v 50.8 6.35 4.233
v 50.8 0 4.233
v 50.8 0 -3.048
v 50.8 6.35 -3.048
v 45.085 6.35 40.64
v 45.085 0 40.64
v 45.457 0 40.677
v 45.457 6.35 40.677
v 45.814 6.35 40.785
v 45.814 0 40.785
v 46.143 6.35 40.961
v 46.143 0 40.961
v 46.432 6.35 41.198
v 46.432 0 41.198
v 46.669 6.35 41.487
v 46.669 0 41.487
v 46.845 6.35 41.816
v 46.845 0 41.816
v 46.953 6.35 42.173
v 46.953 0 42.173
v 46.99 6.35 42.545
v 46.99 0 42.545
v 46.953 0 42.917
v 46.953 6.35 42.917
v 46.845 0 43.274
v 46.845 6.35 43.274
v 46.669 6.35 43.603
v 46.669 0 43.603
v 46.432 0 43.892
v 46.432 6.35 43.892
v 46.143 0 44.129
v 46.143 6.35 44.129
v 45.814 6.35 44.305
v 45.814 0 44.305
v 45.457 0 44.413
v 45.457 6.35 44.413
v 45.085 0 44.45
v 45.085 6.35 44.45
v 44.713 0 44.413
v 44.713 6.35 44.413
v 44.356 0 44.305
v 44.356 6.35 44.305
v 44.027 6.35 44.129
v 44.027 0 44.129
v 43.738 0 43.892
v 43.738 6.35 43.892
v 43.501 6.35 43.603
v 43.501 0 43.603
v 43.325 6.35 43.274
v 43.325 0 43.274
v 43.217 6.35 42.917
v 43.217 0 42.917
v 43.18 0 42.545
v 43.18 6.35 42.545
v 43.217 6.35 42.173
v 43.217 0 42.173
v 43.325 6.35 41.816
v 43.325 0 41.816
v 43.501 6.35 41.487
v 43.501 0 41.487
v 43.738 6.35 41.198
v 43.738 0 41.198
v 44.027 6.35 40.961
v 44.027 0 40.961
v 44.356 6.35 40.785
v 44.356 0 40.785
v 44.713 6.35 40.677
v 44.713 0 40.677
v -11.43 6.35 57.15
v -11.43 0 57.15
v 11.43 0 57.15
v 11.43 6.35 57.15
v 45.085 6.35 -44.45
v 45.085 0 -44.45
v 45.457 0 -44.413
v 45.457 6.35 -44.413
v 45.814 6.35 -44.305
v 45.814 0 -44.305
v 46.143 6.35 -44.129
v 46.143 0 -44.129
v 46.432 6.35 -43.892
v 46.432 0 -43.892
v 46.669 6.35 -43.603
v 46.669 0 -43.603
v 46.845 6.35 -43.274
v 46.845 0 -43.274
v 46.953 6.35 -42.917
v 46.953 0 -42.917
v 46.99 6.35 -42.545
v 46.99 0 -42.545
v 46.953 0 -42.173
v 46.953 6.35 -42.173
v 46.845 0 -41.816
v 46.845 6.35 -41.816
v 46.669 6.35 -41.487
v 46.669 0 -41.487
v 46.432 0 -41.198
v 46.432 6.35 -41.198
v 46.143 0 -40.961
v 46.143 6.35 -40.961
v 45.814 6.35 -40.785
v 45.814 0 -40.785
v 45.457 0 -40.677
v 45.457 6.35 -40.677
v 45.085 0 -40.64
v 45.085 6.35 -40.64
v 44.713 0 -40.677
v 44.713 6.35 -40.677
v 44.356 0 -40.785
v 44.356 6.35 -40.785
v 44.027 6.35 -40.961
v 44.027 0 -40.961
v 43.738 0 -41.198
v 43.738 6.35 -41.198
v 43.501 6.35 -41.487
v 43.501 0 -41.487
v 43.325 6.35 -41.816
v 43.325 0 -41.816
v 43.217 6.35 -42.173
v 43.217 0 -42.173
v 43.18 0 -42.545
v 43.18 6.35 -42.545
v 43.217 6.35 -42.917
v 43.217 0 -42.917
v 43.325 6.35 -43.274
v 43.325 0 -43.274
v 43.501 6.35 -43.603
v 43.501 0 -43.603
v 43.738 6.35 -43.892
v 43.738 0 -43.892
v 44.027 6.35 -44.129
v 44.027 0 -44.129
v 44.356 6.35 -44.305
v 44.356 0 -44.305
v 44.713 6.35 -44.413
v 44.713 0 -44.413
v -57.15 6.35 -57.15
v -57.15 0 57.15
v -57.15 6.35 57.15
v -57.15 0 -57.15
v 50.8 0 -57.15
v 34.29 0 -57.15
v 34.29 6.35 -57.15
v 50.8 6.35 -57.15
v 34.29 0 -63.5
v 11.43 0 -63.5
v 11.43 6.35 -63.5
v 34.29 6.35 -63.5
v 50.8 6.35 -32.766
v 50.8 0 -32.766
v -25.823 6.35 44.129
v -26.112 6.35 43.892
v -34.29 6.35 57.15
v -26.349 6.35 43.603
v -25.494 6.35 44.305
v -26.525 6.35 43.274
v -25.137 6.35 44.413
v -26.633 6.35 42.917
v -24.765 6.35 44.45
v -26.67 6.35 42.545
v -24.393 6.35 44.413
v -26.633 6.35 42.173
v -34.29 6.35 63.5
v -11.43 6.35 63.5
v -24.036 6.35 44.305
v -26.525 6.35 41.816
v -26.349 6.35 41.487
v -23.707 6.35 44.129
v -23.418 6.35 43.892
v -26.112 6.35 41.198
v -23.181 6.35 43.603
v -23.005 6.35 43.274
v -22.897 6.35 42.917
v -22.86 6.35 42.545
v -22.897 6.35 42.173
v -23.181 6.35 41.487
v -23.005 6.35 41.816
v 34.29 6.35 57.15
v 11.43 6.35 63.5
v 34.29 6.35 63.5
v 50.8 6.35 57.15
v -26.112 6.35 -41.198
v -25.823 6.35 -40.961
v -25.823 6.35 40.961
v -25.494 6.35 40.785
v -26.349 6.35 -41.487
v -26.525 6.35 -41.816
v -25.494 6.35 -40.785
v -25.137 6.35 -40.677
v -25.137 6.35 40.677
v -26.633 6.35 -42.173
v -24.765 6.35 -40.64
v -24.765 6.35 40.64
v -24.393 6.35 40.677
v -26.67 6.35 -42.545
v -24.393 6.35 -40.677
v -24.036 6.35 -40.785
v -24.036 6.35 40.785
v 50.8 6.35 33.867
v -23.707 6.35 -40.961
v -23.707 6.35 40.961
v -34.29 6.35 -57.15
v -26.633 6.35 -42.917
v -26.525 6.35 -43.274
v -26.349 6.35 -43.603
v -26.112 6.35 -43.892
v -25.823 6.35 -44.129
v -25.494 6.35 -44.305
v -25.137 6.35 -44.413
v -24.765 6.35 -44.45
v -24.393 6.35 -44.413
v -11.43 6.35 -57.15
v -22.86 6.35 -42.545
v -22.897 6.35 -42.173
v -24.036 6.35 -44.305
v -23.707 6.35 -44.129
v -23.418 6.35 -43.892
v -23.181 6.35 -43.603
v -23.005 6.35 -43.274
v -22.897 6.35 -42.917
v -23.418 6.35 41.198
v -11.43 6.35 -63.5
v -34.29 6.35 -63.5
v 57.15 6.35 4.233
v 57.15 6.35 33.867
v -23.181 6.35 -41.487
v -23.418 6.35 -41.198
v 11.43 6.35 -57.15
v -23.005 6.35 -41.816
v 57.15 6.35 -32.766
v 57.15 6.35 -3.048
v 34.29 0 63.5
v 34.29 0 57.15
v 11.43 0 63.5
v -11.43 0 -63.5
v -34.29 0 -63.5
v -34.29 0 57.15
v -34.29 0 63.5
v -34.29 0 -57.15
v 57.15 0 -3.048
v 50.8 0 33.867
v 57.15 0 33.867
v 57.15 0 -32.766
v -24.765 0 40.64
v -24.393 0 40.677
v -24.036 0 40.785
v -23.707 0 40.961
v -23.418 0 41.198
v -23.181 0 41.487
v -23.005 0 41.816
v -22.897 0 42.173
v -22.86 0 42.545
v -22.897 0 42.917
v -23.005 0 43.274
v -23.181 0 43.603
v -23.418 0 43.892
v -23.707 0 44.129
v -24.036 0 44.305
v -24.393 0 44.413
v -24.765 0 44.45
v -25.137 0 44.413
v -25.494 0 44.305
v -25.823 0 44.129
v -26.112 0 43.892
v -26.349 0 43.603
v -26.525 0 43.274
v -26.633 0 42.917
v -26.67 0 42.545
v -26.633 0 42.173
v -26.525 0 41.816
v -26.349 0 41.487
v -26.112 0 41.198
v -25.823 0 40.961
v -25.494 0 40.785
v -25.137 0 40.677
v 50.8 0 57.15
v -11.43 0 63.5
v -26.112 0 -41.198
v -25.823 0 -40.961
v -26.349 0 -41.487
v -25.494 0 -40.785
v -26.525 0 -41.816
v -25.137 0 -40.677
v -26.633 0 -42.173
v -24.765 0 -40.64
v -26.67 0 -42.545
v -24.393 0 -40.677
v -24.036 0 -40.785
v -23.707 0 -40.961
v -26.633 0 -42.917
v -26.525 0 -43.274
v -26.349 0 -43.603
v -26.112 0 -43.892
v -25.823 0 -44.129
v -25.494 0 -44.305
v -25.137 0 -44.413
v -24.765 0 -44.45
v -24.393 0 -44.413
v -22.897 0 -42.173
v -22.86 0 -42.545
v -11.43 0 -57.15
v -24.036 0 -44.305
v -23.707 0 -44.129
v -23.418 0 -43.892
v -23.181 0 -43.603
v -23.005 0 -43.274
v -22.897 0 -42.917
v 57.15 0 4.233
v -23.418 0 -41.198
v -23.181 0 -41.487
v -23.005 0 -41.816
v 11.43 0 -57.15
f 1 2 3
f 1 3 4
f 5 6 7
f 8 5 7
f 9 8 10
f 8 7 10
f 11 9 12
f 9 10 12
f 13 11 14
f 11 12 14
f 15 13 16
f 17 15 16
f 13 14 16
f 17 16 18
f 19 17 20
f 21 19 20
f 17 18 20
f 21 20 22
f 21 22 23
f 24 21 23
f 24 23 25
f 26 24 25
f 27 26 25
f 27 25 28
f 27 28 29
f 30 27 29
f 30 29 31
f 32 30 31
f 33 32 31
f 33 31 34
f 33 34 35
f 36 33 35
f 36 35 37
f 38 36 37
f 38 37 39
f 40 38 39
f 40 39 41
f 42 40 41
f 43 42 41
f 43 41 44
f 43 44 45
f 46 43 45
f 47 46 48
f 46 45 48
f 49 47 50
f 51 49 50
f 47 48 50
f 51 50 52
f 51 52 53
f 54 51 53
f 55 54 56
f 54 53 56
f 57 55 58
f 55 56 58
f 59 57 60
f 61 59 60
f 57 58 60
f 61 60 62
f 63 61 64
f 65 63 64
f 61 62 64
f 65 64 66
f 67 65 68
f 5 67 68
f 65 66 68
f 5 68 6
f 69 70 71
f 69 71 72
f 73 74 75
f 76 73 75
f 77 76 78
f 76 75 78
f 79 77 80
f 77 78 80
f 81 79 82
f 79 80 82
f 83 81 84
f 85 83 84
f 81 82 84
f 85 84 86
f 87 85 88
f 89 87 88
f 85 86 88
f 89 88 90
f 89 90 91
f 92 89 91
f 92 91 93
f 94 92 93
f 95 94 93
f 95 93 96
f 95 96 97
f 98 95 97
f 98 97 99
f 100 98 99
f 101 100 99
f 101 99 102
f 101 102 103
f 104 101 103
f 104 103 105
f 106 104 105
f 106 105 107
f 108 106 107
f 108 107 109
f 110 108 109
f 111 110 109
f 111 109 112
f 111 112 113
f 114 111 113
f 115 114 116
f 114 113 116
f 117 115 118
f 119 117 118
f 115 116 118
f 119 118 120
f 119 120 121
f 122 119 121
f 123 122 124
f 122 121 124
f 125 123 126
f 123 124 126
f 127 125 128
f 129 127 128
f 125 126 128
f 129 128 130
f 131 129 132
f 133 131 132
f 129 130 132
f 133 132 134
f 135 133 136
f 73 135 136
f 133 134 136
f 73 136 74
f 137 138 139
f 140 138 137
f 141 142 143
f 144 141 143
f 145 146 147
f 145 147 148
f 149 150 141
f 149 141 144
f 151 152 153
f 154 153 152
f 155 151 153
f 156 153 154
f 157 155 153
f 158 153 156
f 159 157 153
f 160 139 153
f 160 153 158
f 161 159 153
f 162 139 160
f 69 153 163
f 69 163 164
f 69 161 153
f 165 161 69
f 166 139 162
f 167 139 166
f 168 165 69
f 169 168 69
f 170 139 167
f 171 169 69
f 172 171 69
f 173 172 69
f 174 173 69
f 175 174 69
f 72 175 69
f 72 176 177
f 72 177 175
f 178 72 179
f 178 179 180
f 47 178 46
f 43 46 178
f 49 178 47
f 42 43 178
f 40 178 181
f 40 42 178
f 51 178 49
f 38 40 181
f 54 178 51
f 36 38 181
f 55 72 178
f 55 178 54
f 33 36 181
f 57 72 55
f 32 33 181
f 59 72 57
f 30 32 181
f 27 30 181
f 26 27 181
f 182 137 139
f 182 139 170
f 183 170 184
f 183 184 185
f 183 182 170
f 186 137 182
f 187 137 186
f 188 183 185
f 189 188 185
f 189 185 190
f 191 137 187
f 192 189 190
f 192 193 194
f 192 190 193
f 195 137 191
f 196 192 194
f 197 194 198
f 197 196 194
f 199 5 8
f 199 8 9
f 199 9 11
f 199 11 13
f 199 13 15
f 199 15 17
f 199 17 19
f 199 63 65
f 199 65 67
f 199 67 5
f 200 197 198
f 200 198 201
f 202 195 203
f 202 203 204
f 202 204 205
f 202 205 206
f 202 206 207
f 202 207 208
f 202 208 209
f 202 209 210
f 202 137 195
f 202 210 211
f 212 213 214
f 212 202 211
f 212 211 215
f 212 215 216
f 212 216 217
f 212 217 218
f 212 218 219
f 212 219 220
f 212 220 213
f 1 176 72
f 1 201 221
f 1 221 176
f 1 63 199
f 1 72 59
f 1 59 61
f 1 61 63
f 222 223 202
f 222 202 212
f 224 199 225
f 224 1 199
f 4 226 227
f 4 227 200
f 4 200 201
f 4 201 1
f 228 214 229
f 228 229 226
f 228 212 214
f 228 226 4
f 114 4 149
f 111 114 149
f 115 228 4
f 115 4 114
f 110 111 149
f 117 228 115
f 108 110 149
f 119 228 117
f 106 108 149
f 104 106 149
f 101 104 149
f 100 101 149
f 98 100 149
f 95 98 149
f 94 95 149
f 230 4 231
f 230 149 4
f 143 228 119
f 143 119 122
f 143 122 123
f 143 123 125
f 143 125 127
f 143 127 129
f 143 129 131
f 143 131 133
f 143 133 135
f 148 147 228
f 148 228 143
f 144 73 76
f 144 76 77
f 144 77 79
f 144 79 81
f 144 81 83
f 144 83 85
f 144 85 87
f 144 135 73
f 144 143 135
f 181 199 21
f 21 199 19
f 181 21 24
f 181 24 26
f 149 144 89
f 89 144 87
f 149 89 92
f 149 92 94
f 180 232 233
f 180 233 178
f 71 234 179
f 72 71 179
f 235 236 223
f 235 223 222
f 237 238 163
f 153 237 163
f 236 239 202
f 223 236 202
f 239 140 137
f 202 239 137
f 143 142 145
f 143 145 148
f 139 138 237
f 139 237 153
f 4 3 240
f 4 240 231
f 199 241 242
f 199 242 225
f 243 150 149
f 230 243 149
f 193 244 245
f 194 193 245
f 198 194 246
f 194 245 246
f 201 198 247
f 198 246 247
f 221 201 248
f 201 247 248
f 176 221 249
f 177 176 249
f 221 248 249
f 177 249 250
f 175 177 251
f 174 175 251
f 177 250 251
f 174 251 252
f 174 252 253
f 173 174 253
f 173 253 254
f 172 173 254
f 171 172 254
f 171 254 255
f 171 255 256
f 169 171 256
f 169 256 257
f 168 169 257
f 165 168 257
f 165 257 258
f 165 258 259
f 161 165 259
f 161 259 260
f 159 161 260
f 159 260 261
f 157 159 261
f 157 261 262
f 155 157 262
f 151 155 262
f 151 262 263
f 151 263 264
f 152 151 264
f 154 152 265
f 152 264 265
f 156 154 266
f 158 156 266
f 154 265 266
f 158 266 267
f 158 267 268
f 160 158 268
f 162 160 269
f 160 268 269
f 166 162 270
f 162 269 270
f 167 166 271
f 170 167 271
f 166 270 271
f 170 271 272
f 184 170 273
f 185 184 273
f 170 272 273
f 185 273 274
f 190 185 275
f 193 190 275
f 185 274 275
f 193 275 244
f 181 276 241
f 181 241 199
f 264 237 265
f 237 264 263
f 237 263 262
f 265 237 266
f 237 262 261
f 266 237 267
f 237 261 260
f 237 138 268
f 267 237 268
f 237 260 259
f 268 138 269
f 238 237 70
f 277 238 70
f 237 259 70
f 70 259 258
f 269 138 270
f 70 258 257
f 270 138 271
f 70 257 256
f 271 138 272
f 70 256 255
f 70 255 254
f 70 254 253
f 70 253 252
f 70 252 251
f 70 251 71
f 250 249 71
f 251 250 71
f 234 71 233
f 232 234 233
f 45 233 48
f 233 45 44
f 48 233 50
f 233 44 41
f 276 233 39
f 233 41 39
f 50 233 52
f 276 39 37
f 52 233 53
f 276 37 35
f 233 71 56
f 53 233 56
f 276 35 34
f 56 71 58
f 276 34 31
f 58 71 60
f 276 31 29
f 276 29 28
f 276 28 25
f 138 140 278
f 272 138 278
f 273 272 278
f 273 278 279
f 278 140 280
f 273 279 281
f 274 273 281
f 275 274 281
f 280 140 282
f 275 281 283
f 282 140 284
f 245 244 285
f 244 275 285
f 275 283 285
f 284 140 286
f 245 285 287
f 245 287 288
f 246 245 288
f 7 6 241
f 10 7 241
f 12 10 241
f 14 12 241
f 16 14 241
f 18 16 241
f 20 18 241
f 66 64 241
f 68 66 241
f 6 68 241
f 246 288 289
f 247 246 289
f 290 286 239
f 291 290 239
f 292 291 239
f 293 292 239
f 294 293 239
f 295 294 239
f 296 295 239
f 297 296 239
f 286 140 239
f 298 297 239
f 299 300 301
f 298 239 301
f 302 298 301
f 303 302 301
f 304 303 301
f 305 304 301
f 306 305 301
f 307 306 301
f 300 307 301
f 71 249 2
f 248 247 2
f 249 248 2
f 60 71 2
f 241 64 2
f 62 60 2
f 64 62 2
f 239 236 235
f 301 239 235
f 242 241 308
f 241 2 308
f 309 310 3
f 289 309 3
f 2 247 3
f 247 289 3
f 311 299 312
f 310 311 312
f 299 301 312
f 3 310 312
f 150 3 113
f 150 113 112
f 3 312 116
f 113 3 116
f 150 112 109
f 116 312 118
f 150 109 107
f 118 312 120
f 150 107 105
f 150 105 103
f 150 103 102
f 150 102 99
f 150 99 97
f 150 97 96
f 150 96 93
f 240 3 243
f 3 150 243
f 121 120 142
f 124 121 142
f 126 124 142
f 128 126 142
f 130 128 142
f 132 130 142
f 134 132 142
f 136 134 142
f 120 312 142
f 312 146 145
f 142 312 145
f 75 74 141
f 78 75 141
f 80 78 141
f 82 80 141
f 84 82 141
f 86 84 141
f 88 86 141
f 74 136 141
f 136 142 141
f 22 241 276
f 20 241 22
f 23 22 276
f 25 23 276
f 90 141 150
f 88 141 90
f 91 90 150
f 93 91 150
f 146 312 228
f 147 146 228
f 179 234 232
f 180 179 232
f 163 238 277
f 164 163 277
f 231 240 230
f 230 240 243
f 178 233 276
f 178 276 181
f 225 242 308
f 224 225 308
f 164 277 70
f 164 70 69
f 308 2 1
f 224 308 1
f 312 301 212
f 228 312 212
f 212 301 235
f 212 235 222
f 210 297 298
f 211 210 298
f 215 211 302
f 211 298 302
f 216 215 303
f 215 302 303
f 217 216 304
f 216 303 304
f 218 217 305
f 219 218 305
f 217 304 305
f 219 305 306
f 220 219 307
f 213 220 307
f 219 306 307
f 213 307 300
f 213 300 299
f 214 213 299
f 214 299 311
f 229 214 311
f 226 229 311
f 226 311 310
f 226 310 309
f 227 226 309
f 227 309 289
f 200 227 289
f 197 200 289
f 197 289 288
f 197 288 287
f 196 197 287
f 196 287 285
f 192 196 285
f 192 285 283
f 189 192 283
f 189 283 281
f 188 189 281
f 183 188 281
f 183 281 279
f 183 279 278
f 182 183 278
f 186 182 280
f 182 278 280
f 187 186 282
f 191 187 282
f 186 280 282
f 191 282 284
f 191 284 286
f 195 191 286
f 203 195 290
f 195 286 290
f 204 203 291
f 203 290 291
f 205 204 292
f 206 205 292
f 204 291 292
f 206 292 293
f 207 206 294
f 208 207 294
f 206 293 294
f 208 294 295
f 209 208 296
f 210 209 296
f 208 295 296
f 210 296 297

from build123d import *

# Parameters (mm, degrees)
SKETCH1_W           = 114.3
SKETCH1_H           = 127
BOSS_EXTRUDE1_DEPTH = 6.35
CAVITY2_START       = 50.8
CAVITY2_OUTLINE_W   = 6.35
CAVITY2_OUTLINE_H   = 29.633333333
CAVITY2_OUTLINE_H_2 = 7.281333333
CAVITY2_OUTLINE_H_3 = 30.734
CAVITY2_DEPTH       = 6.35
CAVITY2_START_2     = -57.15
CAVITY2_2_OUTLINE_W = 6.35
CAVITY2_2_OUTLINE_H = 6.35
CAVITY2_2_DEPTH     = 22.86
CAVITY2_START_3     = -11.43
CAVITY2_3_OUTLINE_W = 6.35
CAVITY2_3_OUTLINE_H = 6.35
CAVITY2_3_DEPTH     = 22.86
CAVITY2_START_4     = 34.29
CAVITY2_4_OUTLINE_W = 6.35
CAVITY2_4_OUTLINE_H = 6.35
CAVITY2_4_DEPTH     = 16.51
SKETCH2_R           = 1.905
CUT_EXTRUDE1_DEPTH  = 86.666183527


# Read off the part's stored shape, not the designer's step: Cavity2
with BuildPart() as part:
    # Sketch1 → Boss-Extrude1 (new body)
    with BuildSketch(Plane(origin=(0, 0, 0), x_dir=(1, 0, 0), z_dir=(0, 1, 0))):
        Rectangle(SKETCH1_W, SKETCH1_H)
    extrude(amount=BOSS_EXTRUDE1_DEPTH)

    # Cavity2 outline → Cavity2 (cut)
    with BuildSketch(Plane.YZ.offset(CAVITY2_START)):
        with Locations((3.175, 48.683333334)):
            Rectangle(CAVITY2_OUTLINE_W, CAVITY2_OUTLINE_H)
        with Locations((3.175, 0.592666666)):
            Rectangle(CAVITY2_OUTLINE_W, CAVITY2_OUTLINE_H_2)
        with Locations((3.175, -48.133)):
            Rectangle(CAVITY2_OUTLINE_W, CAVITY2_OUTLINE_H_3)
    extrude(amount=CAVITY2_DEPTH, mode=Mode.SUBTRACT)

    # Cavity2 2 outline → Cavity2 2 (cut)
    with BuildSketch(Plane.YZ.offset(CAVITY2_START_2)):
        with Locations((3.175, 60.325)):
            Rectangle(CAVITY2_2_OUTLINE_W, CAVITY2_2_OUTLINE_H)
        with Locations((3.175, -60.325)):
            Rectangle(CAVITY2_2_OUTLINE_W, CAVITY2_2_OUTLINE_H)
    extrude(amount=CAVITY2_2_DEPTH, mode=Mode.SUBTRACT)

    # Cavity2 3 outline → Cavity2 3 (cut)
    with BuildSketch(Plane.YZ.offset(CAVITY2_START_3)):
        with Locations((3.175, 60.325)):
            Rectangle(CAVITY2_3_OUTLINE_W, CAVITY2_3_OUTLINE_H)
        with Locations((3.175, -60.325)):
            Rectangle(CAVITY2_3_OUTLINE_W, CAVITY2_3_OUTLINE_H)
    extrude(amount=CAVITY2_3_DEPTH, mode=Mode.SUBTRACT)

    # Cavity2 4 outline → Cavity2 4 (cut)
    with BuildSketch(Plane.YZ.offset(CAVITY2_START_4)):
        with Locations((3.175, 60.325)):
            Rectangle(CAVITY2_4_OUTLINE_W, CAVITY2_4_OUTLINE_H)
        with Locations((3.175, -60.325)):
            Rectangle(CAVITY2_4_OUTLINE_W, CAVITY2_4_OUTLINE_H)
    extrude(amount=CAVITY2_4_DEPTH, mode=Mode.SUBTRACT)

    # Sketch2 → Cut-Extrude1 (cut, through all)
    with BuildSketch(Plane.XZ):
        with Locations(Location((45.085, -42.545, 0), (0, 0, 270))):
            Circle(SKETCH2_R)
        with Locations(Location((-24.765, -42.545, 0), (0, 0, 270))):
            Circle(SKETCH2_R)
        with Locations(Location((45.085, 42.545, 0), (0, 0, 270))):
            Circle(SKETCH2_R)
        with Locations(Location((-24.765, 42.545, 0), (0, 0, 270))):
            Circle(SKETCH2_R)
    extrude(amount=-CUT_EXTRUDE1_DEPTH, mode=Mode.SUBTRACT)


solid = part.part
